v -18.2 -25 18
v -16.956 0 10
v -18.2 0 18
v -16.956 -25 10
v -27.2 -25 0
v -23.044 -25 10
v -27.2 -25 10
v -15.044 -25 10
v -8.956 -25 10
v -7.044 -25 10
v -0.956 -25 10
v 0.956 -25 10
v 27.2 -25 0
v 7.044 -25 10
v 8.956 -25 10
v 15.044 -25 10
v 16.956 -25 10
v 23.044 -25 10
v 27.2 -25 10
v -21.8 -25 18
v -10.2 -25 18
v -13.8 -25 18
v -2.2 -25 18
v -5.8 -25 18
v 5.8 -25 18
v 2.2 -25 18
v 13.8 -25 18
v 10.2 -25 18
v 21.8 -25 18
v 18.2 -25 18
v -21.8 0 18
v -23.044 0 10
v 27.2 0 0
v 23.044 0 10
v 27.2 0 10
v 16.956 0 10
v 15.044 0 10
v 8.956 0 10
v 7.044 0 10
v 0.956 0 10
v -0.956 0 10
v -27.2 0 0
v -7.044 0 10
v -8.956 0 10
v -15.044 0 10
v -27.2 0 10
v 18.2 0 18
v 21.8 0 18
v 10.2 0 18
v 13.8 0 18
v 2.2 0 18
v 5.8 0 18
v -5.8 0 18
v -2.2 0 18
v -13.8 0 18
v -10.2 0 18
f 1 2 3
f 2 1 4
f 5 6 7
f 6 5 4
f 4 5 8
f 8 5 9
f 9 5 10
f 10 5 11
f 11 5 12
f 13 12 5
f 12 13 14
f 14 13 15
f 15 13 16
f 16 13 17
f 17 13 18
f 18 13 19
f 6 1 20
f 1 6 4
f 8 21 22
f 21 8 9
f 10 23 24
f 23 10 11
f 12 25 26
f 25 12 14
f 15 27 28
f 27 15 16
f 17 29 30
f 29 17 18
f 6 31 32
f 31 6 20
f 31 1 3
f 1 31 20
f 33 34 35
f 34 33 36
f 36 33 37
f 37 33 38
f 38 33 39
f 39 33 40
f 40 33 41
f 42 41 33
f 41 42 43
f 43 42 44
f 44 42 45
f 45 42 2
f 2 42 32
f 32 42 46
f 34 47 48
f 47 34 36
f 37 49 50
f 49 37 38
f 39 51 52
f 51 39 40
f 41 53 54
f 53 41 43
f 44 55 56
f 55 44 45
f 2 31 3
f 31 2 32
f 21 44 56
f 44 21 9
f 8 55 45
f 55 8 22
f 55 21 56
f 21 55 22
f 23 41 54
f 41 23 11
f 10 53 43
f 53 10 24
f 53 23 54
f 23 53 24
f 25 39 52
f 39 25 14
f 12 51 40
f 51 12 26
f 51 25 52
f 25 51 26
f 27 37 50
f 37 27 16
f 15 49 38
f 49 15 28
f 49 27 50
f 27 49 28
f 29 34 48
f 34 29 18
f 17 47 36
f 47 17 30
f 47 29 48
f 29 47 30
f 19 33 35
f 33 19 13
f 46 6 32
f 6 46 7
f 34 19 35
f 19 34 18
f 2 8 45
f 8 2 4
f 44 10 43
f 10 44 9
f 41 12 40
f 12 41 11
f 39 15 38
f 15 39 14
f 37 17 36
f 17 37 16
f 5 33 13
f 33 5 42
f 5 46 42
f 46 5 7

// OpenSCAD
$fn = 32;

// ----------------------------------------------------------------------
// Toothed rack, 6 teeth
// 8 mm pitch, 8 mm teeth
// ----------------------------------------------------------------------

// --- parameters (mm) ---
bar_w = 25;       // bar width (Y)
seat_tol = 0.05;  // tolerance at the seating features
free_tol = 0.3;   // general tolerance on the free sizes
bar_h = 10;       // bar height (Z)
teeth = 6;        // number of teeth
pitch = 8;        // tooth pitch
tooth_h = 8;      // tooth height above the bar
root_w = 6.4;     // tooth width at the root
crest_w = 3.6;    // tooth width at the crest

// --- derived feature positions (mm) ---
span = (teeth - 1) * pitch;  // = 40   distance between the outer teeth
bar_l = span + root_w + 8;   // = 54.4   bar length: teeth plus 4 mm at each end
tooth_x = -span / 2;         // = -20   X of the first tooth
height = bar_h + tooth_h;    // = 18   overall height
feature_centers = [
  [tooth_x + 0 * pitch, -bar_w / 2],
  [tooth_x + 1 * pitch, -bar_w / 2],
  [tooth_x + 2 * pitch, -bar_w / 2],
  [tooth_x + 3 * pitch, -bar_w / 2],
  [tooth_x + 4 * pitch, -bar_w / 2],
  [tooth_x + 5 * pitch, -bar_w / 2]
];   // tooth centre line, drives the tooth loop

// bar with a rack of teeth, one extruded trapezoium per centre
module rack_tooth() {
  linear_extrude(height = bar_w)
    polygon(points = [
      [0, 0],
      [root_w, 0],
      [root_w / 2 + crest_w / 2, tooth_h + 1],
      [root_w / 2 - crest_w / 2, tooth_h + 1]
    ]);
}

union() {
  translate([-bar_l / 2, -bar_w, 0]) cube([bar_l, bar_w, bar_h]);
  for (centre = feature_centers)
    translate([centre[0] - root_w / 2, 0, bar_h - 1]) rotate([90, 0, 0]) rack_tooth();
}
